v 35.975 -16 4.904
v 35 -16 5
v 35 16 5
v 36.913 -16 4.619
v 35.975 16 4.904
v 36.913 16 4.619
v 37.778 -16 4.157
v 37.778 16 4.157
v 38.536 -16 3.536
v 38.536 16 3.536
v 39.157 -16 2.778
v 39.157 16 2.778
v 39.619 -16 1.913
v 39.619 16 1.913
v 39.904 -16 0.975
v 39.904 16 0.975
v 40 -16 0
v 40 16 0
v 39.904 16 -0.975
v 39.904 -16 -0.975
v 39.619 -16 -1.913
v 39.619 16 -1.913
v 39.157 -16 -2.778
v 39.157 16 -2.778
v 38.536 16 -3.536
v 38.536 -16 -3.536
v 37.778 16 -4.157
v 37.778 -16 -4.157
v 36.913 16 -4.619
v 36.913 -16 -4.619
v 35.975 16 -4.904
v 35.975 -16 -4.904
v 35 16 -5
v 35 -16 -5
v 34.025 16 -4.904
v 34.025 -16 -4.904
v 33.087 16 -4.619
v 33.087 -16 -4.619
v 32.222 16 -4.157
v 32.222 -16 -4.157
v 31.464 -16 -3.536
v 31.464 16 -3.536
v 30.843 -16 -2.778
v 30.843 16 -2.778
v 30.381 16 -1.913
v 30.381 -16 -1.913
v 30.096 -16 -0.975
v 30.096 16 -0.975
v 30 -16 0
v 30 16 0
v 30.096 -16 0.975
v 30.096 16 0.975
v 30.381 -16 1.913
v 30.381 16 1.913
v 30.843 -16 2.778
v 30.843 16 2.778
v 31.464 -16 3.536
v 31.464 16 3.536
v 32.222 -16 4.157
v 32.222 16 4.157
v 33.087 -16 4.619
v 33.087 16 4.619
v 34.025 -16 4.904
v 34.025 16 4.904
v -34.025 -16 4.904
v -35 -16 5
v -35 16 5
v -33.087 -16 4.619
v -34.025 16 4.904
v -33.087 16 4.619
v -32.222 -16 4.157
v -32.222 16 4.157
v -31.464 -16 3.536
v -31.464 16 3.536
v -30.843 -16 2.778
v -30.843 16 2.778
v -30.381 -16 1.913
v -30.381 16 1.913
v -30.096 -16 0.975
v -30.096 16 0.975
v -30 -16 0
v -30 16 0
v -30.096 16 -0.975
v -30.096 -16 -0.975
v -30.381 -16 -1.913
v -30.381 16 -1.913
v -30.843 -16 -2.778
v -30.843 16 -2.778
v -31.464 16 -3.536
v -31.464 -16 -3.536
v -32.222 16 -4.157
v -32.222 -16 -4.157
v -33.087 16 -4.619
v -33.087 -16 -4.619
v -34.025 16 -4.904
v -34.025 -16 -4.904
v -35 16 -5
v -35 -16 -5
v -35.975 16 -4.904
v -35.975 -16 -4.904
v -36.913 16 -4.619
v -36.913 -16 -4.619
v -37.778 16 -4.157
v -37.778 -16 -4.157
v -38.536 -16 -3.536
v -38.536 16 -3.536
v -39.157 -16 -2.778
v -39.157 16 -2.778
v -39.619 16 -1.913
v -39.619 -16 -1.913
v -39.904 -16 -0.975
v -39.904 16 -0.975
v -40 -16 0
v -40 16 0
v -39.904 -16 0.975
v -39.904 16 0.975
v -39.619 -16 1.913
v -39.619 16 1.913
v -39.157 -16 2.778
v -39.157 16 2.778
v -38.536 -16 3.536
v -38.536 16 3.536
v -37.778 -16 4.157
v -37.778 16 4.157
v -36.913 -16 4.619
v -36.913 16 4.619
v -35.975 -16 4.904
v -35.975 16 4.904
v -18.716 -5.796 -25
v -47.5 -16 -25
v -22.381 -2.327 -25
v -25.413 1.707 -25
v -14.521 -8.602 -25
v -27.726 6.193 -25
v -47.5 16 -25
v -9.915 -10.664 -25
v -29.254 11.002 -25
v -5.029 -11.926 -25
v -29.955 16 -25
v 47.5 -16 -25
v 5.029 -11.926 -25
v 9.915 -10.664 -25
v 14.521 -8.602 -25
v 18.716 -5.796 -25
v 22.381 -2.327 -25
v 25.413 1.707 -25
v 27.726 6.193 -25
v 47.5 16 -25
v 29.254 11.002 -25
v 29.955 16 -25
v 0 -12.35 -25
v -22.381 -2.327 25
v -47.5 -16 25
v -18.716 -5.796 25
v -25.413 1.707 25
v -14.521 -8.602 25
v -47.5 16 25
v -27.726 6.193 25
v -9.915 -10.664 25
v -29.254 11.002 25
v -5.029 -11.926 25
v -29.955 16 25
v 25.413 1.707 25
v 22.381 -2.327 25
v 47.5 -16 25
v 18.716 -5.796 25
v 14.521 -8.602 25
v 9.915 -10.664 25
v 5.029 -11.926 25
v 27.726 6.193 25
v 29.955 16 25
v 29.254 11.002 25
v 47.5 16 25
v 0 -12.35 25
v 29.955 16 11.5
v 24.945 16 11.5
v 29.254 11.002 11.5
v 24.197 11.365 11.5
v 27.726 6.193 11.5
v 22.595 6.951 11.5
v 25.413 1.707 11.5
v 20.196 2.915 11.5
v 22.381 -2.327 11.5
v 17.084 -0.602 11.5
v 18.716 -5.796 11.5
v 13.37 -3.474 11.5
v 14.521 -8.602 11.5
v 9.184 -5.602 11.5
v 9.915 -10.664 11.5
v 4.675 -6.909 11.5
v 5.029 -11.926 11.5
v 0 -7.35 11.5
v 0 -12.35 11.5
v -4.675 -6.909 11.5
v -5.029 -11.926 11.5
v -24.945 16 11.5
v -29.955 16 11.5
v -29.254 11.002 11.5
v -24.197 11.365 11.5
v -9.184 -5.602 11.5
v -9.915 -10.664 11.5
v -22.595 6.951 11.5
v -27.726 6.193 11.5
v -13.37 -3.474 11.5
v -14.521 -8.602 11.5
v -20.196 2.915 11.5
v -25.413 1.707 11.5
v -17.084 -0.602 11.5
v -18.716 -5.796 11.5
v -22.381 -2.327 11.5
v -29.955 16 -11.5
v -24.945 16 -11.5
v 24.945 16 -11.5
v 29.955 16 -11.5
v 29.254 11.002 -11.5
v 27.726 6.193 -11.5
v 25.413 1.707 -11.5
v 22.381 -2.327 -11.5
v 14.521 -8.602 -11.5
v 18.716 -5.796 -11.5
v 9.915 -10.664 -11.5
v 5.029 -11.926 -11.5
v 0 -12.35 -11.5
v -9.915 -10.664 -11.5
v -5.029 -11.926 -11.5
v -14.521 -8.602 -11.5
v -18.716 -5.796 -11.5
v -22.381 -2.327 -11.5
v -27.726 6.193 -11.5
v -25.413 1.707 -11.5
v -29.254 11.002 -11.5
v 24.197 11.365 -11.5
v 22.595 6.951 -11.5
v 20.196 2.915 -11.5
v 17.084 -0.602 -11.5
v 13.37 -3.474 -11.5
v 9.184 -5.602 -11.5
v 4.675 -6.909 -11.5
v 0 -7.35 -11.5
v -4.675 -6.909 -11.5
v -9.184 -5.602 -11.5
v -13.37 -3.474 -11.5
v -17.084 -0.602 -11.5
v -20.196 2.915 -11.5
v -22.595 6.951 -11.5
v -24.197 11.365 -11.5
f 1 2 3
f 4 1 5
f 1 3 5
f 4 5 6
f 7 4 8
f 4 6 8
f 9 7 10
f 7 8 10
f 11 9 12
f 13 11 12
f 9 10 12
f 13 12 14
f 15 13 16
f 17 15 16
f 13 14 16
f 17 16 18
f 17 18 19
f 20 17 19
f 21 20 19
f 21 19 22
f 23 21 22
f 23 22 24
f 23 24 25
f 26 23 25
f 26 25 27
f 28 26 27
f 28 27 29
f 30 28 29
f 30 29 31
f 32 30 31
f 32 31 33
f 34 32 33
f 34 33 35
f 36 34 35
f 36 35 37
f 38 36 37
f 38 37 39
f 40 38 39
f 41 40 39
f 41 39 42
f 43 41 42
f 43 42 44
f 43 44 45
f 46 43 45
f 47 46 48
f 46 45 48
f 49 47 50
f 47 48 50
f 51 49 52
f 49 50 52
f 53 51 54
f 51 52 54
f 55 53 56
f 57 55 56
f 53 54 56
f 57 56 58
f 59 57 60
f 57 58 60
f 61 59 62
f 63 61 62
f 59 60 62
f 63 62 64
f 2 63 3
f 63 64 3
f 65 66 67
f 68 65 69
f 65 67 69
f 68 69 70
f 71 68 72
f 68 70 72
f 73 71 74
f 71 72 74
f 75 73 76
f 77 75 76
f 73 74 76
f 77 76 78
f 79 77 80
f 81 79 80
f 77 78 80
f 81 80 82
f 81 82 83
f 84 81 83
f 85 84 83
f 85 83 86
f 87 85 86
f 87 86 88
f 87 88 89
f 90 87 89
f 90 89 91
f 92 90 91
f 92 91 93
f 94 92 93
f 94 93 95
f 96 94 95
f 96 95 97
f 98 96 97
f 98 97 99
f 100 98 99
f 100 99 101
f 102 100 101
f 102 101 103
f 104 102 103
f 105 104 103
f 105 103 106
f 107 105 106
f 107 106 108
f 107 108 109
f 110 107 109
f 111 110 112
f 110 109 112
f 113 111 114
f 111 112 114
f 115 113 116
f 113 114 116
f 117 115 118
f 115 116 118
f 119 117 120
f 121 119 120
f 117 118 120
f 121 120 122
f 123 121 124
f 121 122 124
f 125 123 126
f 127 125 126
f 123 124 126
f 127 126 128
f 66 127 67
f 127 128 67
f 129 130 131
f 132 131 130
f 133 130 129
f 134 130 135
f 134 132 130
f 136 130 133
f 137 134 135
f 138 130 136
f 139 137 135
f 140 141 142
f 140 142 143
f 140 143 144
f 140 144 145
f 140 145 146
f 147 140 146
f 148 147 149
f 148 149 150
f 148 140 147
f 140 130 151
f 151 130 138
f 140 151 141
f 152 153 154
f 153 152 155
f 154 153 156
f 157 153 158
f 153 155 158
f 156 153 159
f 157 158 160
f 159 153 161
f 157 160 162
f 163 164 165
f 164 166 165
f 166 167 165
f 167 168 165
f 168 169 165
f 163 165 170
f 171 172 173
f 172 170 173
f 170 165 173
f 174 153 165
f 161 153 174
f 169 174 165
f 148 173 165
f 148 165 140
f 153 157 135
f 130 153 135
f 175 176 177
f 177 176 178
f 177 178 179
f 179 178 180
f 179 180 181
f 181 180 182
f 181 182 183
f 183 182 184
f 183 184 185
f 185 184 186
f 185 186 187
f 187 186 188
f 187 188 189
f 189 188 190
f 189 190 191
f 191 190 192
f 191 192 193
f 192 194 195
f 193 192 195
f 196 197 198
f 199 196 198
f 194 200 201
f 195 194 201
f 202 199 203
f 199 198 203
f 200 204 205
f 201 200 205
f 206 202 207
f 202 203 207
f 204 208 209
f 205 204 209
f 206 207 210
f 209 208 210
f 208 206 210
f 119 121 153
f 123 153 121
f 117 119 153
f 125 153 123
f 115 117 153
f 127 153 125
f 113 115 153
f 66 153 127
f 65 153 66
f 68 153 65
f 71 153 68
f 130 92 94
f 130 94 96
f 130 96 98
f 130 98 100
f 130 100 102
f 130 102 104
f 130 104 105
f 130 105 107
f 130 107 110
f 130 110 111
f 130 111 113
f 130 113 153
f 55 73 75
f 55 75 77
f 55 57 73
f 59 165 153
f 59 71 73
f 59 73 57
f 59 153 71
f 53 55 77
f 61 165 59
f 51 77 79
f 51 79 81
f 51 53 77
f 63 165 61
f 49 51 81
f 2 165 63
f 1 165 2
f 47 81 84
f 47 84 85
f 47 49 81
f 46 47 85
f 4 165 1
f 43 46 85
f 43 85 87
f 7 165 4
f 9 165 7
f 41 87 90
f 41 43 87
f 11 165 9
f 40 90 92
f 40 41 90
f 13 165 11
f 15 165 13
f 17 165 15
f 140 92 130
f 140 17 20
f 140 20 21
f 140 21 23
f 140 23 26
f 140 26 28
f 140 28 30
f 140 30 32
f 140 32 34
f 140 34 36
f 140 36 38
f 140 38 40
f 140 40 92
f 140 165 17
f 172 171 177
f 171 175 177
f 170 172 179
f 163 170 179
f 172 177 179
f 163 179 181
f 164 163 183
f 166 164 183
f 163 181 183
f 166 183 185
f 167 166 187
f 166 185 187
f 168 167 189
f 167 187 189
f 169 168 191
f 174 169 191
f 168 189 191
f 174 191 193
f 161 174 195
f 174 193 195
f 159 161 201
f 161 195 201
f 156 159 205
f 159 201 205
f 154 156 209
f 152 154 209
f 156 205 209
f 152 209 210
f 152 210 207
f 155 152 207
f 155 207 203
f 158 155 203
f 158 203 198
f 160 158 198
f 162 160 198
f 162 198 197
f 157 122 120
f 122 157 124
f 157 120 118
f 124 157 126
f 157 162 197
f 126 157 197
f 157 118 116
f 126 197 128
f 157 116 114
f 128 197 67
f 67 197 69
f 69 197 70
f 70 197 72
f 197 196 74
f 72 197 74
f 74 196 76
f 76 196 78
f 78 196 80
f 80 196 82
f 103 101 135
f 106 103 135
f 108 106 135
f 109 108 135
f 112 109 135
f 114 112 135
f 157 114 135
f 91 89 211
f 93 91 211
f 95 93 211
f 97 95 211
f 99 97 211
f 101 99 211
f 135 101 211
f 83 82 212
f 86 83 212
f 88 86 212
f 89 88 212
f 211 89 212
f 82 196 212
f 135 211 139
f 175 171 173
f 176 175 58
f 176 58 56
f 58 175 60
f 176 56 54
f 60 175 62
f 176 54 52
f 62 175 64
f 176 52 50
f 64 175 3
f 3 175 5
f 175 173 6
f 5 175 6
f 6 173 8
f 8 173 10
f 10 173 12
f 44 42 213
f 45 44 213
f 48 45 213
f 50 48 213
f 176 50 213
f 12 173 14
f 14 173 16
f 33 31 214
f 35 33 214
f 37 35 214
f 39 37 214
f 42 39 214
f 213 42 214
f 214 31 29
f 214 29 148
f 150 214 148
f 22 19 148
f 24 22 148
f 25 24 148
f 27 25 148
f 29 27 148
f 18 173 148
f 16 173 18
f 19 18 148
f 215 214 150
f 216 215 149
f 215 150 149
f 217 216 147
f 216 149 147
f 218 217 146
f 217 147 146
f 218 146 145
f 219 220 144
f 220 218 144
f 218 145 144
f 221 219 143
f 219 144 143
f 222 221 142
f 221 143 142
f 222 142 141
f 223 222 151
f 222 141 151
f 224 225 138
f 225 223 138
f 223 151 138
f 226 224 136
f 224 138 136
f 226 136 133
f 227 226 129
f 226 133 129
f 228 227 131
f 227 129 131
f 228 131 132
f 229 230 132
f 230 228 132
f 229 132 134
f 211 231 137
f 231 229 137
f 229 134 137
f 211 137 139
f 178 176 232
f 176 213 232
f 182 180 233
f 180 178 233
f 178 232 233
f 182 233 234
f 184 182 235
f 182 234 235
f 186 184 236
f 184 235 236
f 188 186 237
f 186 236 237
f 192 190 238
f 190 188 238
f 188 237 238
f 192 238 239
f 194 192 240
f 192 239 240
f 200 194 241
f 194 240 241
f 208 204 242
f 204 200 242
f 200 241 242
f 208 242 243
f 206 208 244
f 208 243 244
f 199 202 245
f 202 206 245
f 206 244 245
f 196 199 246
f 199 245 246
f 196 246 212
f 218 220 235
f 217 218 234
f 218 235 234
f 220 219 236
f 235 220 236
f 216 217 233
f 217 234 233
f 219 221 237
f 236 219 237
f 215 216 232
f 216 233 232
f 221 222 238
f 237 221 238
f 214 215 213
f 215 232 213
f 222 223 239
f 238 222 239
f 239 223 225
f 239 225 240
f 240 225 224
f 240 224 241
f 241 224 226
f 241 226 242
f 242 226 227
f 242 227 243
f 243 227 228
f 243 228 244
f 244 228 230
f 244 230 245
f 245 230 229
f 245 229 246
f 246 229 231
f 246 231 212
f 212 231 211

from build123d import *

# Parameters (mm, degrees)
SKETCH1_W           = 50
SKETCH1_H           = 32
BOSS_EXTRUDE1_DEPTH = 47.5
SKETCH4_R           = 5
CUT_EXTRUDE1_DEPTH  = 75


with BuildPart() as part:
    # Sketch1 → Boss-Extrude1 (new, symmetric)
    with BuildSketch(Plane(origin=(0, 0, 0), x_dir=(0, 0, -1), z_dir=(1, 0, 0))):
        Rectangle(SKETCH1_W, SKETCH1_H)
    extrude(amount=BOSS_EXTRUDE1_DEPTH, both=True)

    # Sketch3 → Cut-Revolve1 (revolve, cut)
    with BuildSketch(Plane(origin=(0, 0, 0), x_dir=(0, 0, -1), z_dir=(1, 0, 0))):
        Polygon((-25, -12.35), (-11.5, -12.35), (-11.5, -7.35), (11.5, -7.35), (11.5, -12.35), (25, -12.35), (25, 16.59588936), (-25, 16.59588936), align=None)
    revolve(axis=Axis((0, 17.65, -20.249126458), (0, 0, -1)), mode=Mode.SUBTRACT)

    # Sketch4 → Cut-Extrude1 (cut)
    with BuildSketch(Plane(origin=(0, 16, 0), x_dir=(1, 0, 0), z_dir=(0, 1, 0))):
        with Locations(Location((-35, 0, 0), (0, 0, 270))):
            Circle(SKETCH4_R)
        with Locations(Location((35, 0, 0), (0, 0, 270))):
            Circle(SKETCH4_R)
    extrude(amount=-CUT_EXTRUDE1_DEPTH, mode=Mode.SUBTRACT)


solid = part.part
